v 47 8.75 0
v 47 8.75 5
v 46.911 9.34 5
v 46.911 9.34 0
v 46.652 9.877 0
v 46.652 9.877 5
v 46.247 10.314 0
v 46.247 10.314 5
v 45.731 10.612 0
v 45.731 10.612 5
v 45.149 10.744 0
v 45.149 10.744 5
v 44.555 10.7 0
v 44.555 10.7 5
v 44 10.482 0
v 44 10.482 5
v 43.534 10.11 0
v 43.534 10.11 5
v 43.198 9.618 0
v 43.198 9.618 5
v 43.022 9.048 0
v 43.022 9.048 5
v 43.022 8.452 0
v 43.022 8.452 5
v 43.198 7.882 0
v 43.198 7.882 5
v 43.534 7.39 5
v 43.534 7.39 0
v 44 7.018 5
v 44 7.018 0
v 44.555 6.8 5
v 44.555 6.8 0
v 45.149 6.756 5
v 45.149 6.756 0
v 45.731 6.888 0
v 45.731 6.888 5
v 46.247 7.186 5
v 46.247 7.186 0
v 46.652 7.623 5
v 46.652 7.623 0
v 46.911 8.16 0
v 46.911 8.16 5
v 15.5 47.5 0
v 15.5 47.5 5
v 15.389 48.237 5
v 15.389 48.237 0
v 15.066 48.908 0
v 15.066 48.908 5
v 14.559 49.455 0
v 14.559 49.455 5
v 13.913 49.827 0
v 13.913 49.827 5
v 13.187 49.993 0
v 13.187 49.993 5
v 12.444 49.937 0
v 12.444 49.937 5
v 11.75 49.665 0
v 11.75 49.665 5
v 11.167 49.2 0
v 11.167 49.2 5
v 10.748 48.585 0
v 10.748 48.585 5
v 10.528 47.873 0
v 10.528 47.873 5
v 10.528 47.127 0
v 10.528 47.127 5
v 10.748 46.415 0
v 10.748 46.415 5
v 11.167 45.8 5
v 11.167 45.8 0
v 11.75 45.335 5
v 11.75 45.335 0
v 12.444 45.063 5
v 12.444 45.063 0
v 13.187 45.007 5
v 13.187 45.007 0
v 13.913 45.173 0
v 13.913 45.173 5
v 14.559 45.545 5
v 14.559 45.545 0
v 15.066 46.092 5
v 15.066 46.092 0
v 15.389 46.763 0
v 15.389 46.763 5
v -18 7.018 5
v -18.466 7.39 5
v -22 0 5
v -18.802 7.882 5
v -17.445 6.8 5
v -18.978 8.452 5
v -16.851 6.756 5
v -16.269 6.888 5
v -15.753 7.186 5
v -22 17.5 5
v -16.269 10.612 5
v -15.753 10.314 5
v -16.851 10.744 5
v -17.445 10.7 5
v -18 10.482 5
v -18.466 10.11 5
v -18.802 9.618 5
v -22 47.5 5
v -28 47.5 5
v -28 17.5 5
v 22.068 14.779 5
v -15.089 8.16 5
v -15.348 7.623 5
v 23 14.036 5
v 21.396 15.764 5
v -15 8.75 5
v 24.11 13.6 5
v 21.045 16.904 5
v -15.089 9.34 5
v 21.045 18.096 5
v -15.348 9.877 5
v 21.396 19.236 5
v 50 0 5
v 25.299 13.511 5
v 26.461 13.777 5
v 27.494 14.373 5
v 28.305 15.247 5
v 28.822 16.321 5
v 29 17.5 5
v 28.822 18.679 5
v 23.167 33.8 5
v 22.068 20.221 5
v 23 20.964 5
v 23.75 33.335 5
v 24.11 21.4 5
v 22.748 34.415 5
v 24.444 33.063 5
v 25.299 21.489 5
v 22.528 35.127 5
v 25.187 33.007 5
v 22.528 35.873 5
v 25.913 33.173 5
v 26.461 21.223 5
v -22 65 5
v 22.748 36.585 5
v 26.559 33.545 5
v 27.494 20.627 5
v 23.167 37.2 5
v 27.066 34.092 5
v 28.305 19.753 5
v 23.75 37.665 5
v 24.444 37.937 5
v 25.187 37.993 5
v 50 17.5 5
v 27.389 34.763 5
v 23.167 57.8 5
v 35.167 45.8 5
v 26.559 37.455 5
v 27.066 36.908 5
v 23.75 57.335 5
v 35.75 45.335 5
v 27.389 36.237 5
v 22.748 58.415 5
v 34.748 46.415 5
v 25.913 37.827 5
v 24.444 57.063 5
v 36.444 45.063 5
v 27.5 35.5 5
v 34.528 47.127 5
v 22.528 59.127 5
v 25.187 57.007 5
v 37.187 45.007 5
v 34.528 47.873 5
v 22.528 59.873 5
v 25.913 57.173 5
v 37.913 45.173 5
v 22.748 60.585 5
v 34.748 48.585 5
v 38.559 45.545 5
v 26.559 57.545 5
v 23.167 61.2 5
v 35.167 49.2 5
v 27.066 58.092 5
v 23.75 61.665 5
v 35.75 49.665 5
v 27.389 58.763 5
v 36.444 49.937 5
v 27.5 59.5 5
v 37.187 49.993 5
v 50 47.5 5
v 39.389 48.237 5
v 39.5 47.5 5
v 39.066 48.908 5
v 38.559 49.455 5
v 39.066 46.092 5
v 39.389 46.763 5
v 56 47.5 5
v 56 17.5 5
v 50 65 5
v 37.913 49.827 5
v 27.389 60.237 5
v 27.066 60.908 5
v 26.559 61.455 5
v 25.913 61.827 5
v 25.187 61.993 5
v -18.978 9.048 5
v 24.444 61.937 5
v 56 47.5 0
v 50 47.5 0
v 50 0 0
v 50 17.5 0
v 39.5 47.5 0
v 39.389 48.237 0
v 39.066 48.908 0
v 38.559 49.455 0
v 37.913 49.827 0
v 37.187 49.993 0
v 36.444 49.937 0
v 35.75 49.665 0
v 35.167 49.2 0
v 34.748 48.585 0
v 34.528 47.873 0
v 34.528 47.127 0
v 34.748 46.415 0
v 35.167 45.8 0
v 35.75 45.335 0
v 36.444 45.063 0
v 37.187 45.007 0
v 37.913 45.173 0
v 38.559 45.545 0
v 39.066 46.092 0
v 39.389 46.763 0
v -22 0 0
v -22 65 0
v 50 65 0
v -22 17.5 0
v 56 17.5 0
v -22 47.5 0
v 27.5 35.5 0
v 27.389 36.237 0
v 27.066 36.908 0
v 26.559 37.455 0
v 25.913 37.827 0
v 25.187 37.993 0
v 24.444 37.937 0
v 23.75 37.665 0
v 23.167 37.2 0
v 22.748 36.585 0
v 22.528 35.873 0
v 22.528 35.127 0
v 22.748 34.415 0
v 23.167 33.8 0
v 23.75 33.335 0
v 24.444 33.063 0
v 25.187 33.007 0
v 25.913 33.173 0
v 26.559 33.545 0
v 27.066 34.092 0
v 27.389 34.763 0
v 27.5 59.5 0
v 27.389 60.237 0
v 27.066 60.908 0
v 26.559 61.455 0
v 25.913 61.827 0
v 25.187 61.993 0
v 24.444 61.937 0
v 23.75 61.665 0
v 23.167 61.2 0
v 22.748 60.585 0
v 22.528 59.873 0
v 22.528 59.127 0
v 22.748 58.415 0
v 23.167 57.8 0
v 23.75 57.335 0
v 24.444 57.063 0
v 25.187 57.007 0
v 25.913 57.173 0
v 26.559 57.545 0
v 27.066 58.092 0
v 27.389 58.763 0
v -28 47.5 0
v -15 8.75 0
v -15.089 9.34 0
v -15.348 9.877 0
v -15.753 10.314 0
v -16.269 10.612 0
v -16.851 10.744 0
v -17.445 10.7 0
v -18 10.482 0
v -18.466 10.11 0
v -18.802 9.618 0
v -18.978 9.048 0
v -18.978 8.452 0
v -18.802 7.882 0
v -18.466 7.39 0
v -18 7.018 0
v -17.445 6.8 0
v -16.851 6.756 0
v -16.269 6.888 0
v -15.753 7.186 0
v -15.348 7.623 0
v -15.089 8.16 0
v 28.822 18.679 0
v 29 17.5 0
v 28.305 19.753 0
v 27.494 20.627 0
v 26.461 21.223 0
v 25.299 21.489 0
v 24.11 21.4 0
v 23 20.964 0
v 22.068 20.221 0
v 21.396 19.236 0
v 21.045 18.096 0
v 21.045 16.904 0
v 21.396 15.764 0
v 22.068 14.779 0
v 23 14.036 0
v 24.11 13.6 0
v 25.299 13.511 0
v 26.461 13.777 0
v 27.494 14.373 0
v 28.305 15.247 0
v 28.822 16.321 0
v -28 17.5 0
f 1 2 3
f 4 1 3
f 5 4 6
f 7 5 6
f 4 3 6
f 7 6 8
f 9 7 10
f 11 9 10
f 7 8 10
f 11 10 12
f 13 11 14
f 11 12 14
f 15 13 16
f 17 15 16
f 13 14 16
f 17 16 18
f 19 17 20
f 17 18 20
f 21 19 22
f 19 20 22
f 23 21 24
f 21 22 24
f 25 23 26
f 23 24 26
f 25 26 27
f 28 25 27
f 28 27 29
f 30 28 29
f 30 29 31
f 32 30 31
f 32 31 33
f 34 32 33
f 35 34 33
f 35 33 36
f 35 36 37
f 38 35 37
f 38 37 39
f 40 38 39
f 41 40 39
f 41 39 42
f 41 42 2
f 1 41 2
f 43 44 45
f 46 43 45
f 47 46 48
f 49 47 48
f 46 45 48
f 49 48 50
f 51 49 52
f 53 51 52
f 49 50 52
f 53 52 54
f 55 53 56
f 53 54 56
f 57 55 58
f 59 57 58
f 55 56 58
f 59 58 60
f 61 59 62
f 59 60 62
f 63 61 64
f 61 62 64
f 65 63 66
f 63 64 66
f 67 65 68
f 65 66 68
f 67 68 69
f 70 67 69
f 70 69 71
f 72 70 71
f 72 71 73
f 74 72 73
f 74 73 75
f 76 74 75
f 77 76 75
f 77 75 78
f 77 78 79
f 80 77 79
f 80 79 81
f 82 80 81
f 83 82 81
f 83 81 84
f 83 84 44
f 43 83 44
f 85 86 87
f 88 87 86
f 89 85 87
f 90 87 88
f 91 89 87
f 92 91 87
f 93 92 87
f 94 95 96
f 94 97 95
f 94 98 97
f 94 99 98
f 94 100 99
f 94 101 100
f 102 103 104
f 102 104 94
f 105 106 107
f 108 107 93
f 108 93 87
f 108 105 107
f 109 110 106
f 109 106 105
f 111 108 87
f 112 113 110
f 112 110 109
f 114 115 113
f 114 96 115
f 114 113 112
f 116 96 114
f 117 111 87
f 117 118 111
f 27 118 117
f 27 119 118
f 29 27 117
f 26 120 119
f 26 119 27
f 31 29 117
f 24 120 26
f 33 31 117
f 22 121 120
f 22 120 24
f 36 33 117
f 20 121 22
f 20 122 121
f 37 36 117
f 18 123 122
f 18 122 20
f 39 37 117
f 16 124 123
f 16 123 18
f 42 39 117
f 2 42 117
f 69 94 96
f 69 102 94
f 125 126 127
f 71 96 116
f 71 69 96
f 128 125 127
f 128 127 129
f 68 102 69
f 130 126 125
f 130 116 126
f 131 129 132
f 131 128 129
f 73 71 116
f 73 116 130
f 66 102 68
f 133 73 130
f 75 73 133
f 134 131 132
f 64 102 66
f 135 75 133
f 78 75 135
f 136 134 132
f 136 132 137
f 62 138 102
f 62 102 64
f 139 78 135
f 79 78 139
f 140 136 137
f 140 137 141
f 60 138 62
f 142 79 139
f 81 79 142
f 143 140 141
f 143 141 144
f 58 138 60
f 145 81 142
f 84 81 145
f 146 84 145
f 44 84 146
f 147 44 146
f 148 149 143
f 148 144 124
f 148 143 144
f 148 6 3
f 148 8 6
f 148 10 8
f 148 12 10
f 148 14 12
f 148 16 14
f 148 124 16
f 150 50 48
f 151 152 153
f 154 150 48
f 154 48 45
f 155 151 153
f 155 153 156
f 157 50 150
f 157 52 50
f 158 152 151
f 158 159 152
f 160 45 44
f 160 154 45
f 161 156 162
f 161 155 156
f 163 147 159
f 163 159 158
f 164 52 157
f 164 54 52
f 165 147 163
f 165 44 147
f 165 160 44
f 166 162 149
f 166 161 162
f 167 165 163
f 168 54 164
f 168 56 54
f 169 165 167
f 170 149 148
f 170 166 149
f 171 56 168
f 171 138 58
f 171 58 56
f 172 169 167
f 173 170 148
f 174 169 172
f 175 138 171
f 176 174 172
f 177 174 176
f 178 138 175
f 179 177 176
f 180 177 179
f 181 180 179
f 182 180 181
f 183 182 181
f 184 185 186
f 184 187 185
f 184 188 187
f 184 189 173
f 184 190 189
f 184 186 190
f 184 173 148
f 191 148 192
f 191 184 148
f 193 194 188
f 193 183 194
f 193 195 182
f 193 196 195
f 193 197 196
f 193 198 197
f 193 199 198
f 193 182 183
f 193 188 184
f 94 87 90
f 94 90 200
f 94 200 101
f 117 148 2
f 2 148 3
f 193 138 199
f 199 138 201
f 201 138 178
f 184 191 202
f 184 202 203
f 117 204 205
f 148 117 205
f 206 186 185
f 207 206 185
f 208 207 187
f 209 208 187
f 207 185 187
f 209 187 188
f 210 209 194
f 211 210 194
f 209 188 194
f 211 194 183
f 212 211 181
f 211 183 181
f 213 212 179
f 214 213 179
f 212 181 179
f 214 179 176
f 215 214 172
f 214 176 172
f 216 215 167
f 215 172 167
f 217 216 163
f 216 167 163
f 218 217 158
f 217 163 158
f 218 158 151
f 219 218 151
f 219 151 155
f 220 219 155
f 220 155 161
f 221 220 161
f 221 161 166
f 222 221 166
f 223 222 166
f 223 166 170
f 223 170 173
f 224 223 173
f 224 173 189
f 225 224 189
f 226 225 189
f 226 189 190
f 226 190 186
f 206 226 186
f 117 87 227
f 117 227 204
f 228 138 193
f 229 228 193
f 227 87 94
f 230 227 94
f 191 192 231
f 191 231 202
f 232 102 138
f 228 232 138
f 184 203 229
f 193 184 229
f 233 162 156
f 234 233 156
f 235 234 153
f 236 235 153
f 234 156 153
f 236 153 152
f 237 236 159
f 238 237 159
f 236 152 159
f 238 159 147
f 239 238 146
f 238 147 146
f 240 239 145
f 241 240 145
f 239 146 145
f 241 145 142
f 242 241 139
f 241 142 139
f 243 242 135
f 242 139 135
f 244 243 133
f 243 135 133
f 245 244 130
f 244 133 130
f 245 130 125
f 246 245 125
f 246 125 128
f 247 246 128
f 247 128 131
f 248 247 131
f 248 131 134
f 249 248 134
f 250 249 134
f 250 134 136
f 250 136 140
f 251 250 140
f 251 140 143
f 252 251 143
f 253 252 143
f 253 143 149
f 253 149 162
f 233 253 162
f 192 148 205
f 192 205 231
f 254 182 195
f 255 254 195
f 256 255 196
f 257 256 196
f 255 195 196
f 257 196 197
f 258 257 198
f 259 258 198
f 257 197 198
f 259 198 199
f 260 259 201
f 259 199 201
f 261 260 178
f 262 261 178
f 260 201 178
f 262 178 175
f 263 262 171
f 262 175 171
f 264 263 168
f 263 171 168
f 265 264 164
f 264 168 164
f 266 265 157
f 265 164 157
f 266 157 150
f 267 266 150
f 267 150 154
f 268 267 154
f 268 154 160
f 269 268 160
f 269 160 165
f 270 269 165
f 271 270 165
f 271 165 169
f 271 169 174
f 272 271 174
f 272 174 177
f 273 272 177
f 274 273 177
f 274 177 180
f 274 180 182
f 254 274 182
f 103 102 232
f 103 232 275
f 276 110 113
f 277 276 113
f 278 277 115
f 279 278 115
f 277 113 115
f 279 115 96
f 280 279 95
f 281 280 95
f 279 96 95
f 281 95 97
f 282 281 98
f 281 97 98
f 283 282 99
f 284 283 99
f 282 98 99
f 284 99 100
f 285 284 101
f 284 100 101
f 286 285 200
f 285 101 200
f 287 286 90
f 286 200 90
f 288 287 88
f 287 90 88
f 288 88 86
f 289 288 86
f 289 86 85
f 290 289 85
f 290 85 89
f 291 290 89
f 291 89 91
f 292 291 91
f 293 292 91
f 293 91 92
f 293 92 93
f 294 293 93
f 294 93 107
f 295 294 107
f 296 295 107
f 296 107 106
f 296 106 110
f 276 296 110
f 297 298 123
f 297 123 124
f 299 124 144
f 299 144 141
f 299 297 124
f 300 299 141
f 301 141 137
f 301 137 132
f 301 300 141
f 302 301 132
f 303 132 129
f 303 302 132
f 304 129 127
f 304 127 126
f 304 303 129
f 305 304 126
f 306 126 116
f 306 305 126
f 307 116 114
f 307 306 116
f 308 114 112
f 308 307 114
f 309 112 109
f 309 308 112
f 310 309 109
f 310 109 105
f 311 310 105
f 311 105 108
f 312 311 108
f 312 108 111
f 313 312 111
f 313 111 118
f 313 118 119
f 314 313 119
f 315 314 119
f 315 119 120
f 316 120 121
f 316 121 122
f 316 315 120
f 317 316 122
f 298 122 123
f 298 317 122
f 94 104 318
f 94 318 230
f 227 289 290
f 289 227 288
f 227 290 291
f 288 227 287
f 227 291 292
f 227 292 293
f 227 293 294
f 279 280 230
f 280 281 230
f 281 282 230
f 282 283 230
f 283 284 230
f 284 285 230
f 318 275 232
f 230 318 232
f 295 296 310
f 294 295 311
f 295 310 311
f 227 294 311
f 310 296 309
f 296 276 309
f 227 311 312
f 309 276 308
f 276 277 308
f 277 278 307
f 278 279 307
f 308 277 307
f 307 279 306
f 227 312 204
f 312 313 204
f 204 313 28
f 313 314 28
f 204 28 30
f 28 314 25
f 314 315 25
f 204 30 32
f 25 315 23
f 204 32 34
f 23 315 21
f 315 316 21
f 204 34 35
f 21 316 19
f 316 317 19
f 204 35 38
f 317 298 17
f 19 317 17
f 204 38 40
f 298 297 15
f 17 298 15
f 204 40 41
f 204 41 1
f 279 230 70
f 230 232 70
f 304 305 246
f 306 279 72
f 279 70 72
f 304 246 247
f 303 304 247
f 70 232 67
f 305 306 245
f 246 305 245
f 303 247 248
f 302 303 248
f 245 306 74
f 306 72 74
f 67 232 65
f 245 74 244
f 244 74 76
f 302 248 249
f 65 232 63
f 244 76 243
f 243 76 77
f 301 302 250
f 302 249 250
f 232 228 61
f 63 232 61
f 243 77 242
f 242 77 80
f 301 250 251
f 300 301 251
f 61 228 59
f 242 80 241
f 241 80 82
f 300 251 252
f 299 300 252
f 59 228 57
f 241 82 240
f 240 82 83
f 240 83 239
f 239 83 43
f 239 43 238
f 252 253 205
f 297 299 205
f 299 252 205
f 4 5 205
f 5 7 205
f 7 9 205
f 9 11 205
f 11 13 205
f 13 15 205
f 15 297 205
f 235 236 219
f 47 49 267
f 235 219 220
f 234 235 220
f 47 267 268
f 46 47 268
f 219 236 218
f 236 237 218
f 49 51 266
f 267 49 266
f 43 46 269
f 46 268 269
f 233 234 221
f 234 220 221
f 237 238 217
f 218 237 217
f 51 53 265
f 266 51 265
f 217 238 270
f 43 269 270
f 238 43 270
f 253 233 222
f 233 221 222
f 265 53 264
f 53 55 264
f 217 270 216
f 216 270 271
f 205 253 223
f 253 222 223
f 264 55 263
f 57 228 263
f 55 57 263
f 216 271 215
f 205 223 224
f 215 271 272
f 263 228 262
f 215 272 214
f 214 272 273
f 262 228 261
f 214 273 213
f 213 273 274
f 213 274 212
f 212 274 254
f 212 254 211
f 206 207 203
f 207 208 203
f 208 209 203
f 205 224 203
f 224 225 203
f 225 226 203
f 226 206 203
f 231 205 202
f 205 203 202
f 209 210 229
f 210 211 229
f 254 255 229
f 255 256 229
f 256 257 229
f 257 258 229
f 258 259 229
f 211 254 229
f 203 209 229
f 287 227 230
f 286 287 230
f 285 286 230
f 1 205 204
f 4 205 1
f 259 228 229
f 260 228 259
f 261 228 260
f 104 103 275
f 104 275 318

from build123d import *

# Parameters (mm, degrees)
SKETCH2_W           = 50
SKETCH2_H           = 65
SKETCH2_R           = 2
SKETCH2_R_2         = 4
BOSS_EXTRUDE1_DEPTH = 5
SKETCH3_W           = 21
SKETCH3_H           = 65
BOSS_EXTRUDE2_DEPTH = 5
SKETCH4_W           = 1
SKETCH4_H           = 65
BOSS_EXTRUDE3_DEPTH = 5
BOSS_EXTRUDE4_DEPTH = 5
SKETCH6_R           = 2
CUT_EXTRUDE1_DEPTH  = 59
SKETCH7_R           = 1.5
CUT_EXTRUDE2_DEPTH  = 10
SKETCH7_4_R         = 1.5
CUT_EXTRUDE3_DEPTH  = 10
SKETCH7_5_R         = 1.5
BOSS_EXTRUDE5_DEPTH = 5
SKETCH8_R           = 2
CUT_EXTRUDE4_DEPTH  = 10
SKETCH9_R           = 2.5
CUT_EXTRUDE5_DEPTH  = 10


with BuildPart() as part:
    # Sketch2 → Boss-Extrude1 (new body)
    with BuildSketch(Plane.XY):
        with Locations((25, 32.5)):
            Rectangle(SKETCH2_W, SKETCH2_H)
        with Locations((25, 59.5)):
            Circle(SKETCH2_R, mode=Mode.SUBTRACT)
        with Locations((13, 47.5)):
            Circle(SKETCH2_R, mode=Mode.SUBTRACT)
        with Locations((37, 47.5)):
            Circle(SKETCH2_R, mode=Mode.SUBTRACT)
        with Locations((25, 17.5)):
            Circle(SKETCH2_R_2, mode=Mode.SUBTRACT)
    extrude(amount=BOSS_EXTRUDE1_DEPTH)

    # Sketch3 → Boss-Extrude2 (add)
    with BuildSketch(Plane.XY.offset(5)):
        with Locations((-10.5, 32.5)):
            Rectangle(SKETCH3_W, SKETCH3_H)
    extrude(amount=-BOSS_EXTRUDE2_DEPTH)

    # Sketch4 → Boss-Extrude3 (add)
    with BuildSketch(Plane.XY.offset(5)):
        with Locations((-21.5, 32.5)):
            Rectangle(SKETCH4_W, SKETCH4_H)
    extrude(amount=-BOSS_EXTRUDE3_DEPTH)

    # Sketch5 → Boss-Extrude4 (add)
    with BuildSketch(Plane.XY.offset(5)):
        Polygon((-22, 17.5), (-22, 32.5), (-22, 47.5), (-28, 47.5), (-28, 17.5), align=None)
        Polygon((56, 17.5), (56, 47.5), (50, 47.5), (50, 32.5), (50, 17.5), align=None)
    extrude(amount=-BOSS_EXTRUDE4_DEPTH)

    # Sketch6 → Cut-Extrude1 (cut)
    with BuildSketch(Plane.XY.offset(5)):
        with Locations((25, 35.5)):
            Circle(SKETCH6_R)
    extrude(amount=-CUT_EXTRUDE1_DEPTH, mode=Mode.SUBTRACT)

    # Sketch7 → Cut-Extrude2 (cut)
    with BuildSketch(Plane.XY.offset(5)):
        with Locations((-17, 56.25)):
            Circle(SKETCH7_R)
        with Locations((45, 56.25)):
            Circle(SKETCH7_R)
    extrude(amount=-CUT_EXTRUDE2_DEPTH, mode=Mode.SUBTRACT)

    # Sketch7<4> → Cut-Extrude3 (cut)
    with BuildSketch(Plane.XY.offset(5)):
        with Locations((45, 8.75)):
            Circle(SKETCH7_4_R)
        with Locations((-17, 8.75)):
            Circle(SKETCH7_4_R)
    extrude(amount=-CUT_EXTRUDE3_DEPTH, mode=Mode.SUBTRACT)

    # Sketch7<5> → Boss-Extrude5 (add)
    with BuildSketch(Plane.XY.offset(5)):
        with Locations((-17, 56.25)):
            Circle(SKETCH7_5_R)
        with Locations((45, 56.25)):
            Circle(SKETCH7_5_R)
    extrude(amount=-BOSS_EXTRUDE5_DEPTH)

    # Sketch8 → Cut-Extrude4 (cut)
    with BuildSketch(Plane.XY.offset(5)):
        with Locations((-17, 8.75)):
            Circle(SKETCH8_R)
        with Locations((45, 8.75)):
            Circle(SKETCH8_R)
    extrude(amount=-CUT_EXTRUDE4_DEPTH, mode=Mode.SUBTRACT)

    # Sketch9 → Cut-Extrude5 (cut)
    with BuildSketch(Plane.XY.offset(5)):
        with Locations((25, 59.5)):
            Circle(SKETCH9_R)
        with Locations((25, 35.5)):
            Circle(SKETCH9_R)
        with Locations((13, 47.5)):
            Circle(SKETCH9_R)
        with Locations((37, 47.5)):
            Circle(SKETCH9_R)
    extrude(amount=-CUT_EXTRUDE5_DEPTH, mode=Mode.SUBTRACT)


solid = part.part
